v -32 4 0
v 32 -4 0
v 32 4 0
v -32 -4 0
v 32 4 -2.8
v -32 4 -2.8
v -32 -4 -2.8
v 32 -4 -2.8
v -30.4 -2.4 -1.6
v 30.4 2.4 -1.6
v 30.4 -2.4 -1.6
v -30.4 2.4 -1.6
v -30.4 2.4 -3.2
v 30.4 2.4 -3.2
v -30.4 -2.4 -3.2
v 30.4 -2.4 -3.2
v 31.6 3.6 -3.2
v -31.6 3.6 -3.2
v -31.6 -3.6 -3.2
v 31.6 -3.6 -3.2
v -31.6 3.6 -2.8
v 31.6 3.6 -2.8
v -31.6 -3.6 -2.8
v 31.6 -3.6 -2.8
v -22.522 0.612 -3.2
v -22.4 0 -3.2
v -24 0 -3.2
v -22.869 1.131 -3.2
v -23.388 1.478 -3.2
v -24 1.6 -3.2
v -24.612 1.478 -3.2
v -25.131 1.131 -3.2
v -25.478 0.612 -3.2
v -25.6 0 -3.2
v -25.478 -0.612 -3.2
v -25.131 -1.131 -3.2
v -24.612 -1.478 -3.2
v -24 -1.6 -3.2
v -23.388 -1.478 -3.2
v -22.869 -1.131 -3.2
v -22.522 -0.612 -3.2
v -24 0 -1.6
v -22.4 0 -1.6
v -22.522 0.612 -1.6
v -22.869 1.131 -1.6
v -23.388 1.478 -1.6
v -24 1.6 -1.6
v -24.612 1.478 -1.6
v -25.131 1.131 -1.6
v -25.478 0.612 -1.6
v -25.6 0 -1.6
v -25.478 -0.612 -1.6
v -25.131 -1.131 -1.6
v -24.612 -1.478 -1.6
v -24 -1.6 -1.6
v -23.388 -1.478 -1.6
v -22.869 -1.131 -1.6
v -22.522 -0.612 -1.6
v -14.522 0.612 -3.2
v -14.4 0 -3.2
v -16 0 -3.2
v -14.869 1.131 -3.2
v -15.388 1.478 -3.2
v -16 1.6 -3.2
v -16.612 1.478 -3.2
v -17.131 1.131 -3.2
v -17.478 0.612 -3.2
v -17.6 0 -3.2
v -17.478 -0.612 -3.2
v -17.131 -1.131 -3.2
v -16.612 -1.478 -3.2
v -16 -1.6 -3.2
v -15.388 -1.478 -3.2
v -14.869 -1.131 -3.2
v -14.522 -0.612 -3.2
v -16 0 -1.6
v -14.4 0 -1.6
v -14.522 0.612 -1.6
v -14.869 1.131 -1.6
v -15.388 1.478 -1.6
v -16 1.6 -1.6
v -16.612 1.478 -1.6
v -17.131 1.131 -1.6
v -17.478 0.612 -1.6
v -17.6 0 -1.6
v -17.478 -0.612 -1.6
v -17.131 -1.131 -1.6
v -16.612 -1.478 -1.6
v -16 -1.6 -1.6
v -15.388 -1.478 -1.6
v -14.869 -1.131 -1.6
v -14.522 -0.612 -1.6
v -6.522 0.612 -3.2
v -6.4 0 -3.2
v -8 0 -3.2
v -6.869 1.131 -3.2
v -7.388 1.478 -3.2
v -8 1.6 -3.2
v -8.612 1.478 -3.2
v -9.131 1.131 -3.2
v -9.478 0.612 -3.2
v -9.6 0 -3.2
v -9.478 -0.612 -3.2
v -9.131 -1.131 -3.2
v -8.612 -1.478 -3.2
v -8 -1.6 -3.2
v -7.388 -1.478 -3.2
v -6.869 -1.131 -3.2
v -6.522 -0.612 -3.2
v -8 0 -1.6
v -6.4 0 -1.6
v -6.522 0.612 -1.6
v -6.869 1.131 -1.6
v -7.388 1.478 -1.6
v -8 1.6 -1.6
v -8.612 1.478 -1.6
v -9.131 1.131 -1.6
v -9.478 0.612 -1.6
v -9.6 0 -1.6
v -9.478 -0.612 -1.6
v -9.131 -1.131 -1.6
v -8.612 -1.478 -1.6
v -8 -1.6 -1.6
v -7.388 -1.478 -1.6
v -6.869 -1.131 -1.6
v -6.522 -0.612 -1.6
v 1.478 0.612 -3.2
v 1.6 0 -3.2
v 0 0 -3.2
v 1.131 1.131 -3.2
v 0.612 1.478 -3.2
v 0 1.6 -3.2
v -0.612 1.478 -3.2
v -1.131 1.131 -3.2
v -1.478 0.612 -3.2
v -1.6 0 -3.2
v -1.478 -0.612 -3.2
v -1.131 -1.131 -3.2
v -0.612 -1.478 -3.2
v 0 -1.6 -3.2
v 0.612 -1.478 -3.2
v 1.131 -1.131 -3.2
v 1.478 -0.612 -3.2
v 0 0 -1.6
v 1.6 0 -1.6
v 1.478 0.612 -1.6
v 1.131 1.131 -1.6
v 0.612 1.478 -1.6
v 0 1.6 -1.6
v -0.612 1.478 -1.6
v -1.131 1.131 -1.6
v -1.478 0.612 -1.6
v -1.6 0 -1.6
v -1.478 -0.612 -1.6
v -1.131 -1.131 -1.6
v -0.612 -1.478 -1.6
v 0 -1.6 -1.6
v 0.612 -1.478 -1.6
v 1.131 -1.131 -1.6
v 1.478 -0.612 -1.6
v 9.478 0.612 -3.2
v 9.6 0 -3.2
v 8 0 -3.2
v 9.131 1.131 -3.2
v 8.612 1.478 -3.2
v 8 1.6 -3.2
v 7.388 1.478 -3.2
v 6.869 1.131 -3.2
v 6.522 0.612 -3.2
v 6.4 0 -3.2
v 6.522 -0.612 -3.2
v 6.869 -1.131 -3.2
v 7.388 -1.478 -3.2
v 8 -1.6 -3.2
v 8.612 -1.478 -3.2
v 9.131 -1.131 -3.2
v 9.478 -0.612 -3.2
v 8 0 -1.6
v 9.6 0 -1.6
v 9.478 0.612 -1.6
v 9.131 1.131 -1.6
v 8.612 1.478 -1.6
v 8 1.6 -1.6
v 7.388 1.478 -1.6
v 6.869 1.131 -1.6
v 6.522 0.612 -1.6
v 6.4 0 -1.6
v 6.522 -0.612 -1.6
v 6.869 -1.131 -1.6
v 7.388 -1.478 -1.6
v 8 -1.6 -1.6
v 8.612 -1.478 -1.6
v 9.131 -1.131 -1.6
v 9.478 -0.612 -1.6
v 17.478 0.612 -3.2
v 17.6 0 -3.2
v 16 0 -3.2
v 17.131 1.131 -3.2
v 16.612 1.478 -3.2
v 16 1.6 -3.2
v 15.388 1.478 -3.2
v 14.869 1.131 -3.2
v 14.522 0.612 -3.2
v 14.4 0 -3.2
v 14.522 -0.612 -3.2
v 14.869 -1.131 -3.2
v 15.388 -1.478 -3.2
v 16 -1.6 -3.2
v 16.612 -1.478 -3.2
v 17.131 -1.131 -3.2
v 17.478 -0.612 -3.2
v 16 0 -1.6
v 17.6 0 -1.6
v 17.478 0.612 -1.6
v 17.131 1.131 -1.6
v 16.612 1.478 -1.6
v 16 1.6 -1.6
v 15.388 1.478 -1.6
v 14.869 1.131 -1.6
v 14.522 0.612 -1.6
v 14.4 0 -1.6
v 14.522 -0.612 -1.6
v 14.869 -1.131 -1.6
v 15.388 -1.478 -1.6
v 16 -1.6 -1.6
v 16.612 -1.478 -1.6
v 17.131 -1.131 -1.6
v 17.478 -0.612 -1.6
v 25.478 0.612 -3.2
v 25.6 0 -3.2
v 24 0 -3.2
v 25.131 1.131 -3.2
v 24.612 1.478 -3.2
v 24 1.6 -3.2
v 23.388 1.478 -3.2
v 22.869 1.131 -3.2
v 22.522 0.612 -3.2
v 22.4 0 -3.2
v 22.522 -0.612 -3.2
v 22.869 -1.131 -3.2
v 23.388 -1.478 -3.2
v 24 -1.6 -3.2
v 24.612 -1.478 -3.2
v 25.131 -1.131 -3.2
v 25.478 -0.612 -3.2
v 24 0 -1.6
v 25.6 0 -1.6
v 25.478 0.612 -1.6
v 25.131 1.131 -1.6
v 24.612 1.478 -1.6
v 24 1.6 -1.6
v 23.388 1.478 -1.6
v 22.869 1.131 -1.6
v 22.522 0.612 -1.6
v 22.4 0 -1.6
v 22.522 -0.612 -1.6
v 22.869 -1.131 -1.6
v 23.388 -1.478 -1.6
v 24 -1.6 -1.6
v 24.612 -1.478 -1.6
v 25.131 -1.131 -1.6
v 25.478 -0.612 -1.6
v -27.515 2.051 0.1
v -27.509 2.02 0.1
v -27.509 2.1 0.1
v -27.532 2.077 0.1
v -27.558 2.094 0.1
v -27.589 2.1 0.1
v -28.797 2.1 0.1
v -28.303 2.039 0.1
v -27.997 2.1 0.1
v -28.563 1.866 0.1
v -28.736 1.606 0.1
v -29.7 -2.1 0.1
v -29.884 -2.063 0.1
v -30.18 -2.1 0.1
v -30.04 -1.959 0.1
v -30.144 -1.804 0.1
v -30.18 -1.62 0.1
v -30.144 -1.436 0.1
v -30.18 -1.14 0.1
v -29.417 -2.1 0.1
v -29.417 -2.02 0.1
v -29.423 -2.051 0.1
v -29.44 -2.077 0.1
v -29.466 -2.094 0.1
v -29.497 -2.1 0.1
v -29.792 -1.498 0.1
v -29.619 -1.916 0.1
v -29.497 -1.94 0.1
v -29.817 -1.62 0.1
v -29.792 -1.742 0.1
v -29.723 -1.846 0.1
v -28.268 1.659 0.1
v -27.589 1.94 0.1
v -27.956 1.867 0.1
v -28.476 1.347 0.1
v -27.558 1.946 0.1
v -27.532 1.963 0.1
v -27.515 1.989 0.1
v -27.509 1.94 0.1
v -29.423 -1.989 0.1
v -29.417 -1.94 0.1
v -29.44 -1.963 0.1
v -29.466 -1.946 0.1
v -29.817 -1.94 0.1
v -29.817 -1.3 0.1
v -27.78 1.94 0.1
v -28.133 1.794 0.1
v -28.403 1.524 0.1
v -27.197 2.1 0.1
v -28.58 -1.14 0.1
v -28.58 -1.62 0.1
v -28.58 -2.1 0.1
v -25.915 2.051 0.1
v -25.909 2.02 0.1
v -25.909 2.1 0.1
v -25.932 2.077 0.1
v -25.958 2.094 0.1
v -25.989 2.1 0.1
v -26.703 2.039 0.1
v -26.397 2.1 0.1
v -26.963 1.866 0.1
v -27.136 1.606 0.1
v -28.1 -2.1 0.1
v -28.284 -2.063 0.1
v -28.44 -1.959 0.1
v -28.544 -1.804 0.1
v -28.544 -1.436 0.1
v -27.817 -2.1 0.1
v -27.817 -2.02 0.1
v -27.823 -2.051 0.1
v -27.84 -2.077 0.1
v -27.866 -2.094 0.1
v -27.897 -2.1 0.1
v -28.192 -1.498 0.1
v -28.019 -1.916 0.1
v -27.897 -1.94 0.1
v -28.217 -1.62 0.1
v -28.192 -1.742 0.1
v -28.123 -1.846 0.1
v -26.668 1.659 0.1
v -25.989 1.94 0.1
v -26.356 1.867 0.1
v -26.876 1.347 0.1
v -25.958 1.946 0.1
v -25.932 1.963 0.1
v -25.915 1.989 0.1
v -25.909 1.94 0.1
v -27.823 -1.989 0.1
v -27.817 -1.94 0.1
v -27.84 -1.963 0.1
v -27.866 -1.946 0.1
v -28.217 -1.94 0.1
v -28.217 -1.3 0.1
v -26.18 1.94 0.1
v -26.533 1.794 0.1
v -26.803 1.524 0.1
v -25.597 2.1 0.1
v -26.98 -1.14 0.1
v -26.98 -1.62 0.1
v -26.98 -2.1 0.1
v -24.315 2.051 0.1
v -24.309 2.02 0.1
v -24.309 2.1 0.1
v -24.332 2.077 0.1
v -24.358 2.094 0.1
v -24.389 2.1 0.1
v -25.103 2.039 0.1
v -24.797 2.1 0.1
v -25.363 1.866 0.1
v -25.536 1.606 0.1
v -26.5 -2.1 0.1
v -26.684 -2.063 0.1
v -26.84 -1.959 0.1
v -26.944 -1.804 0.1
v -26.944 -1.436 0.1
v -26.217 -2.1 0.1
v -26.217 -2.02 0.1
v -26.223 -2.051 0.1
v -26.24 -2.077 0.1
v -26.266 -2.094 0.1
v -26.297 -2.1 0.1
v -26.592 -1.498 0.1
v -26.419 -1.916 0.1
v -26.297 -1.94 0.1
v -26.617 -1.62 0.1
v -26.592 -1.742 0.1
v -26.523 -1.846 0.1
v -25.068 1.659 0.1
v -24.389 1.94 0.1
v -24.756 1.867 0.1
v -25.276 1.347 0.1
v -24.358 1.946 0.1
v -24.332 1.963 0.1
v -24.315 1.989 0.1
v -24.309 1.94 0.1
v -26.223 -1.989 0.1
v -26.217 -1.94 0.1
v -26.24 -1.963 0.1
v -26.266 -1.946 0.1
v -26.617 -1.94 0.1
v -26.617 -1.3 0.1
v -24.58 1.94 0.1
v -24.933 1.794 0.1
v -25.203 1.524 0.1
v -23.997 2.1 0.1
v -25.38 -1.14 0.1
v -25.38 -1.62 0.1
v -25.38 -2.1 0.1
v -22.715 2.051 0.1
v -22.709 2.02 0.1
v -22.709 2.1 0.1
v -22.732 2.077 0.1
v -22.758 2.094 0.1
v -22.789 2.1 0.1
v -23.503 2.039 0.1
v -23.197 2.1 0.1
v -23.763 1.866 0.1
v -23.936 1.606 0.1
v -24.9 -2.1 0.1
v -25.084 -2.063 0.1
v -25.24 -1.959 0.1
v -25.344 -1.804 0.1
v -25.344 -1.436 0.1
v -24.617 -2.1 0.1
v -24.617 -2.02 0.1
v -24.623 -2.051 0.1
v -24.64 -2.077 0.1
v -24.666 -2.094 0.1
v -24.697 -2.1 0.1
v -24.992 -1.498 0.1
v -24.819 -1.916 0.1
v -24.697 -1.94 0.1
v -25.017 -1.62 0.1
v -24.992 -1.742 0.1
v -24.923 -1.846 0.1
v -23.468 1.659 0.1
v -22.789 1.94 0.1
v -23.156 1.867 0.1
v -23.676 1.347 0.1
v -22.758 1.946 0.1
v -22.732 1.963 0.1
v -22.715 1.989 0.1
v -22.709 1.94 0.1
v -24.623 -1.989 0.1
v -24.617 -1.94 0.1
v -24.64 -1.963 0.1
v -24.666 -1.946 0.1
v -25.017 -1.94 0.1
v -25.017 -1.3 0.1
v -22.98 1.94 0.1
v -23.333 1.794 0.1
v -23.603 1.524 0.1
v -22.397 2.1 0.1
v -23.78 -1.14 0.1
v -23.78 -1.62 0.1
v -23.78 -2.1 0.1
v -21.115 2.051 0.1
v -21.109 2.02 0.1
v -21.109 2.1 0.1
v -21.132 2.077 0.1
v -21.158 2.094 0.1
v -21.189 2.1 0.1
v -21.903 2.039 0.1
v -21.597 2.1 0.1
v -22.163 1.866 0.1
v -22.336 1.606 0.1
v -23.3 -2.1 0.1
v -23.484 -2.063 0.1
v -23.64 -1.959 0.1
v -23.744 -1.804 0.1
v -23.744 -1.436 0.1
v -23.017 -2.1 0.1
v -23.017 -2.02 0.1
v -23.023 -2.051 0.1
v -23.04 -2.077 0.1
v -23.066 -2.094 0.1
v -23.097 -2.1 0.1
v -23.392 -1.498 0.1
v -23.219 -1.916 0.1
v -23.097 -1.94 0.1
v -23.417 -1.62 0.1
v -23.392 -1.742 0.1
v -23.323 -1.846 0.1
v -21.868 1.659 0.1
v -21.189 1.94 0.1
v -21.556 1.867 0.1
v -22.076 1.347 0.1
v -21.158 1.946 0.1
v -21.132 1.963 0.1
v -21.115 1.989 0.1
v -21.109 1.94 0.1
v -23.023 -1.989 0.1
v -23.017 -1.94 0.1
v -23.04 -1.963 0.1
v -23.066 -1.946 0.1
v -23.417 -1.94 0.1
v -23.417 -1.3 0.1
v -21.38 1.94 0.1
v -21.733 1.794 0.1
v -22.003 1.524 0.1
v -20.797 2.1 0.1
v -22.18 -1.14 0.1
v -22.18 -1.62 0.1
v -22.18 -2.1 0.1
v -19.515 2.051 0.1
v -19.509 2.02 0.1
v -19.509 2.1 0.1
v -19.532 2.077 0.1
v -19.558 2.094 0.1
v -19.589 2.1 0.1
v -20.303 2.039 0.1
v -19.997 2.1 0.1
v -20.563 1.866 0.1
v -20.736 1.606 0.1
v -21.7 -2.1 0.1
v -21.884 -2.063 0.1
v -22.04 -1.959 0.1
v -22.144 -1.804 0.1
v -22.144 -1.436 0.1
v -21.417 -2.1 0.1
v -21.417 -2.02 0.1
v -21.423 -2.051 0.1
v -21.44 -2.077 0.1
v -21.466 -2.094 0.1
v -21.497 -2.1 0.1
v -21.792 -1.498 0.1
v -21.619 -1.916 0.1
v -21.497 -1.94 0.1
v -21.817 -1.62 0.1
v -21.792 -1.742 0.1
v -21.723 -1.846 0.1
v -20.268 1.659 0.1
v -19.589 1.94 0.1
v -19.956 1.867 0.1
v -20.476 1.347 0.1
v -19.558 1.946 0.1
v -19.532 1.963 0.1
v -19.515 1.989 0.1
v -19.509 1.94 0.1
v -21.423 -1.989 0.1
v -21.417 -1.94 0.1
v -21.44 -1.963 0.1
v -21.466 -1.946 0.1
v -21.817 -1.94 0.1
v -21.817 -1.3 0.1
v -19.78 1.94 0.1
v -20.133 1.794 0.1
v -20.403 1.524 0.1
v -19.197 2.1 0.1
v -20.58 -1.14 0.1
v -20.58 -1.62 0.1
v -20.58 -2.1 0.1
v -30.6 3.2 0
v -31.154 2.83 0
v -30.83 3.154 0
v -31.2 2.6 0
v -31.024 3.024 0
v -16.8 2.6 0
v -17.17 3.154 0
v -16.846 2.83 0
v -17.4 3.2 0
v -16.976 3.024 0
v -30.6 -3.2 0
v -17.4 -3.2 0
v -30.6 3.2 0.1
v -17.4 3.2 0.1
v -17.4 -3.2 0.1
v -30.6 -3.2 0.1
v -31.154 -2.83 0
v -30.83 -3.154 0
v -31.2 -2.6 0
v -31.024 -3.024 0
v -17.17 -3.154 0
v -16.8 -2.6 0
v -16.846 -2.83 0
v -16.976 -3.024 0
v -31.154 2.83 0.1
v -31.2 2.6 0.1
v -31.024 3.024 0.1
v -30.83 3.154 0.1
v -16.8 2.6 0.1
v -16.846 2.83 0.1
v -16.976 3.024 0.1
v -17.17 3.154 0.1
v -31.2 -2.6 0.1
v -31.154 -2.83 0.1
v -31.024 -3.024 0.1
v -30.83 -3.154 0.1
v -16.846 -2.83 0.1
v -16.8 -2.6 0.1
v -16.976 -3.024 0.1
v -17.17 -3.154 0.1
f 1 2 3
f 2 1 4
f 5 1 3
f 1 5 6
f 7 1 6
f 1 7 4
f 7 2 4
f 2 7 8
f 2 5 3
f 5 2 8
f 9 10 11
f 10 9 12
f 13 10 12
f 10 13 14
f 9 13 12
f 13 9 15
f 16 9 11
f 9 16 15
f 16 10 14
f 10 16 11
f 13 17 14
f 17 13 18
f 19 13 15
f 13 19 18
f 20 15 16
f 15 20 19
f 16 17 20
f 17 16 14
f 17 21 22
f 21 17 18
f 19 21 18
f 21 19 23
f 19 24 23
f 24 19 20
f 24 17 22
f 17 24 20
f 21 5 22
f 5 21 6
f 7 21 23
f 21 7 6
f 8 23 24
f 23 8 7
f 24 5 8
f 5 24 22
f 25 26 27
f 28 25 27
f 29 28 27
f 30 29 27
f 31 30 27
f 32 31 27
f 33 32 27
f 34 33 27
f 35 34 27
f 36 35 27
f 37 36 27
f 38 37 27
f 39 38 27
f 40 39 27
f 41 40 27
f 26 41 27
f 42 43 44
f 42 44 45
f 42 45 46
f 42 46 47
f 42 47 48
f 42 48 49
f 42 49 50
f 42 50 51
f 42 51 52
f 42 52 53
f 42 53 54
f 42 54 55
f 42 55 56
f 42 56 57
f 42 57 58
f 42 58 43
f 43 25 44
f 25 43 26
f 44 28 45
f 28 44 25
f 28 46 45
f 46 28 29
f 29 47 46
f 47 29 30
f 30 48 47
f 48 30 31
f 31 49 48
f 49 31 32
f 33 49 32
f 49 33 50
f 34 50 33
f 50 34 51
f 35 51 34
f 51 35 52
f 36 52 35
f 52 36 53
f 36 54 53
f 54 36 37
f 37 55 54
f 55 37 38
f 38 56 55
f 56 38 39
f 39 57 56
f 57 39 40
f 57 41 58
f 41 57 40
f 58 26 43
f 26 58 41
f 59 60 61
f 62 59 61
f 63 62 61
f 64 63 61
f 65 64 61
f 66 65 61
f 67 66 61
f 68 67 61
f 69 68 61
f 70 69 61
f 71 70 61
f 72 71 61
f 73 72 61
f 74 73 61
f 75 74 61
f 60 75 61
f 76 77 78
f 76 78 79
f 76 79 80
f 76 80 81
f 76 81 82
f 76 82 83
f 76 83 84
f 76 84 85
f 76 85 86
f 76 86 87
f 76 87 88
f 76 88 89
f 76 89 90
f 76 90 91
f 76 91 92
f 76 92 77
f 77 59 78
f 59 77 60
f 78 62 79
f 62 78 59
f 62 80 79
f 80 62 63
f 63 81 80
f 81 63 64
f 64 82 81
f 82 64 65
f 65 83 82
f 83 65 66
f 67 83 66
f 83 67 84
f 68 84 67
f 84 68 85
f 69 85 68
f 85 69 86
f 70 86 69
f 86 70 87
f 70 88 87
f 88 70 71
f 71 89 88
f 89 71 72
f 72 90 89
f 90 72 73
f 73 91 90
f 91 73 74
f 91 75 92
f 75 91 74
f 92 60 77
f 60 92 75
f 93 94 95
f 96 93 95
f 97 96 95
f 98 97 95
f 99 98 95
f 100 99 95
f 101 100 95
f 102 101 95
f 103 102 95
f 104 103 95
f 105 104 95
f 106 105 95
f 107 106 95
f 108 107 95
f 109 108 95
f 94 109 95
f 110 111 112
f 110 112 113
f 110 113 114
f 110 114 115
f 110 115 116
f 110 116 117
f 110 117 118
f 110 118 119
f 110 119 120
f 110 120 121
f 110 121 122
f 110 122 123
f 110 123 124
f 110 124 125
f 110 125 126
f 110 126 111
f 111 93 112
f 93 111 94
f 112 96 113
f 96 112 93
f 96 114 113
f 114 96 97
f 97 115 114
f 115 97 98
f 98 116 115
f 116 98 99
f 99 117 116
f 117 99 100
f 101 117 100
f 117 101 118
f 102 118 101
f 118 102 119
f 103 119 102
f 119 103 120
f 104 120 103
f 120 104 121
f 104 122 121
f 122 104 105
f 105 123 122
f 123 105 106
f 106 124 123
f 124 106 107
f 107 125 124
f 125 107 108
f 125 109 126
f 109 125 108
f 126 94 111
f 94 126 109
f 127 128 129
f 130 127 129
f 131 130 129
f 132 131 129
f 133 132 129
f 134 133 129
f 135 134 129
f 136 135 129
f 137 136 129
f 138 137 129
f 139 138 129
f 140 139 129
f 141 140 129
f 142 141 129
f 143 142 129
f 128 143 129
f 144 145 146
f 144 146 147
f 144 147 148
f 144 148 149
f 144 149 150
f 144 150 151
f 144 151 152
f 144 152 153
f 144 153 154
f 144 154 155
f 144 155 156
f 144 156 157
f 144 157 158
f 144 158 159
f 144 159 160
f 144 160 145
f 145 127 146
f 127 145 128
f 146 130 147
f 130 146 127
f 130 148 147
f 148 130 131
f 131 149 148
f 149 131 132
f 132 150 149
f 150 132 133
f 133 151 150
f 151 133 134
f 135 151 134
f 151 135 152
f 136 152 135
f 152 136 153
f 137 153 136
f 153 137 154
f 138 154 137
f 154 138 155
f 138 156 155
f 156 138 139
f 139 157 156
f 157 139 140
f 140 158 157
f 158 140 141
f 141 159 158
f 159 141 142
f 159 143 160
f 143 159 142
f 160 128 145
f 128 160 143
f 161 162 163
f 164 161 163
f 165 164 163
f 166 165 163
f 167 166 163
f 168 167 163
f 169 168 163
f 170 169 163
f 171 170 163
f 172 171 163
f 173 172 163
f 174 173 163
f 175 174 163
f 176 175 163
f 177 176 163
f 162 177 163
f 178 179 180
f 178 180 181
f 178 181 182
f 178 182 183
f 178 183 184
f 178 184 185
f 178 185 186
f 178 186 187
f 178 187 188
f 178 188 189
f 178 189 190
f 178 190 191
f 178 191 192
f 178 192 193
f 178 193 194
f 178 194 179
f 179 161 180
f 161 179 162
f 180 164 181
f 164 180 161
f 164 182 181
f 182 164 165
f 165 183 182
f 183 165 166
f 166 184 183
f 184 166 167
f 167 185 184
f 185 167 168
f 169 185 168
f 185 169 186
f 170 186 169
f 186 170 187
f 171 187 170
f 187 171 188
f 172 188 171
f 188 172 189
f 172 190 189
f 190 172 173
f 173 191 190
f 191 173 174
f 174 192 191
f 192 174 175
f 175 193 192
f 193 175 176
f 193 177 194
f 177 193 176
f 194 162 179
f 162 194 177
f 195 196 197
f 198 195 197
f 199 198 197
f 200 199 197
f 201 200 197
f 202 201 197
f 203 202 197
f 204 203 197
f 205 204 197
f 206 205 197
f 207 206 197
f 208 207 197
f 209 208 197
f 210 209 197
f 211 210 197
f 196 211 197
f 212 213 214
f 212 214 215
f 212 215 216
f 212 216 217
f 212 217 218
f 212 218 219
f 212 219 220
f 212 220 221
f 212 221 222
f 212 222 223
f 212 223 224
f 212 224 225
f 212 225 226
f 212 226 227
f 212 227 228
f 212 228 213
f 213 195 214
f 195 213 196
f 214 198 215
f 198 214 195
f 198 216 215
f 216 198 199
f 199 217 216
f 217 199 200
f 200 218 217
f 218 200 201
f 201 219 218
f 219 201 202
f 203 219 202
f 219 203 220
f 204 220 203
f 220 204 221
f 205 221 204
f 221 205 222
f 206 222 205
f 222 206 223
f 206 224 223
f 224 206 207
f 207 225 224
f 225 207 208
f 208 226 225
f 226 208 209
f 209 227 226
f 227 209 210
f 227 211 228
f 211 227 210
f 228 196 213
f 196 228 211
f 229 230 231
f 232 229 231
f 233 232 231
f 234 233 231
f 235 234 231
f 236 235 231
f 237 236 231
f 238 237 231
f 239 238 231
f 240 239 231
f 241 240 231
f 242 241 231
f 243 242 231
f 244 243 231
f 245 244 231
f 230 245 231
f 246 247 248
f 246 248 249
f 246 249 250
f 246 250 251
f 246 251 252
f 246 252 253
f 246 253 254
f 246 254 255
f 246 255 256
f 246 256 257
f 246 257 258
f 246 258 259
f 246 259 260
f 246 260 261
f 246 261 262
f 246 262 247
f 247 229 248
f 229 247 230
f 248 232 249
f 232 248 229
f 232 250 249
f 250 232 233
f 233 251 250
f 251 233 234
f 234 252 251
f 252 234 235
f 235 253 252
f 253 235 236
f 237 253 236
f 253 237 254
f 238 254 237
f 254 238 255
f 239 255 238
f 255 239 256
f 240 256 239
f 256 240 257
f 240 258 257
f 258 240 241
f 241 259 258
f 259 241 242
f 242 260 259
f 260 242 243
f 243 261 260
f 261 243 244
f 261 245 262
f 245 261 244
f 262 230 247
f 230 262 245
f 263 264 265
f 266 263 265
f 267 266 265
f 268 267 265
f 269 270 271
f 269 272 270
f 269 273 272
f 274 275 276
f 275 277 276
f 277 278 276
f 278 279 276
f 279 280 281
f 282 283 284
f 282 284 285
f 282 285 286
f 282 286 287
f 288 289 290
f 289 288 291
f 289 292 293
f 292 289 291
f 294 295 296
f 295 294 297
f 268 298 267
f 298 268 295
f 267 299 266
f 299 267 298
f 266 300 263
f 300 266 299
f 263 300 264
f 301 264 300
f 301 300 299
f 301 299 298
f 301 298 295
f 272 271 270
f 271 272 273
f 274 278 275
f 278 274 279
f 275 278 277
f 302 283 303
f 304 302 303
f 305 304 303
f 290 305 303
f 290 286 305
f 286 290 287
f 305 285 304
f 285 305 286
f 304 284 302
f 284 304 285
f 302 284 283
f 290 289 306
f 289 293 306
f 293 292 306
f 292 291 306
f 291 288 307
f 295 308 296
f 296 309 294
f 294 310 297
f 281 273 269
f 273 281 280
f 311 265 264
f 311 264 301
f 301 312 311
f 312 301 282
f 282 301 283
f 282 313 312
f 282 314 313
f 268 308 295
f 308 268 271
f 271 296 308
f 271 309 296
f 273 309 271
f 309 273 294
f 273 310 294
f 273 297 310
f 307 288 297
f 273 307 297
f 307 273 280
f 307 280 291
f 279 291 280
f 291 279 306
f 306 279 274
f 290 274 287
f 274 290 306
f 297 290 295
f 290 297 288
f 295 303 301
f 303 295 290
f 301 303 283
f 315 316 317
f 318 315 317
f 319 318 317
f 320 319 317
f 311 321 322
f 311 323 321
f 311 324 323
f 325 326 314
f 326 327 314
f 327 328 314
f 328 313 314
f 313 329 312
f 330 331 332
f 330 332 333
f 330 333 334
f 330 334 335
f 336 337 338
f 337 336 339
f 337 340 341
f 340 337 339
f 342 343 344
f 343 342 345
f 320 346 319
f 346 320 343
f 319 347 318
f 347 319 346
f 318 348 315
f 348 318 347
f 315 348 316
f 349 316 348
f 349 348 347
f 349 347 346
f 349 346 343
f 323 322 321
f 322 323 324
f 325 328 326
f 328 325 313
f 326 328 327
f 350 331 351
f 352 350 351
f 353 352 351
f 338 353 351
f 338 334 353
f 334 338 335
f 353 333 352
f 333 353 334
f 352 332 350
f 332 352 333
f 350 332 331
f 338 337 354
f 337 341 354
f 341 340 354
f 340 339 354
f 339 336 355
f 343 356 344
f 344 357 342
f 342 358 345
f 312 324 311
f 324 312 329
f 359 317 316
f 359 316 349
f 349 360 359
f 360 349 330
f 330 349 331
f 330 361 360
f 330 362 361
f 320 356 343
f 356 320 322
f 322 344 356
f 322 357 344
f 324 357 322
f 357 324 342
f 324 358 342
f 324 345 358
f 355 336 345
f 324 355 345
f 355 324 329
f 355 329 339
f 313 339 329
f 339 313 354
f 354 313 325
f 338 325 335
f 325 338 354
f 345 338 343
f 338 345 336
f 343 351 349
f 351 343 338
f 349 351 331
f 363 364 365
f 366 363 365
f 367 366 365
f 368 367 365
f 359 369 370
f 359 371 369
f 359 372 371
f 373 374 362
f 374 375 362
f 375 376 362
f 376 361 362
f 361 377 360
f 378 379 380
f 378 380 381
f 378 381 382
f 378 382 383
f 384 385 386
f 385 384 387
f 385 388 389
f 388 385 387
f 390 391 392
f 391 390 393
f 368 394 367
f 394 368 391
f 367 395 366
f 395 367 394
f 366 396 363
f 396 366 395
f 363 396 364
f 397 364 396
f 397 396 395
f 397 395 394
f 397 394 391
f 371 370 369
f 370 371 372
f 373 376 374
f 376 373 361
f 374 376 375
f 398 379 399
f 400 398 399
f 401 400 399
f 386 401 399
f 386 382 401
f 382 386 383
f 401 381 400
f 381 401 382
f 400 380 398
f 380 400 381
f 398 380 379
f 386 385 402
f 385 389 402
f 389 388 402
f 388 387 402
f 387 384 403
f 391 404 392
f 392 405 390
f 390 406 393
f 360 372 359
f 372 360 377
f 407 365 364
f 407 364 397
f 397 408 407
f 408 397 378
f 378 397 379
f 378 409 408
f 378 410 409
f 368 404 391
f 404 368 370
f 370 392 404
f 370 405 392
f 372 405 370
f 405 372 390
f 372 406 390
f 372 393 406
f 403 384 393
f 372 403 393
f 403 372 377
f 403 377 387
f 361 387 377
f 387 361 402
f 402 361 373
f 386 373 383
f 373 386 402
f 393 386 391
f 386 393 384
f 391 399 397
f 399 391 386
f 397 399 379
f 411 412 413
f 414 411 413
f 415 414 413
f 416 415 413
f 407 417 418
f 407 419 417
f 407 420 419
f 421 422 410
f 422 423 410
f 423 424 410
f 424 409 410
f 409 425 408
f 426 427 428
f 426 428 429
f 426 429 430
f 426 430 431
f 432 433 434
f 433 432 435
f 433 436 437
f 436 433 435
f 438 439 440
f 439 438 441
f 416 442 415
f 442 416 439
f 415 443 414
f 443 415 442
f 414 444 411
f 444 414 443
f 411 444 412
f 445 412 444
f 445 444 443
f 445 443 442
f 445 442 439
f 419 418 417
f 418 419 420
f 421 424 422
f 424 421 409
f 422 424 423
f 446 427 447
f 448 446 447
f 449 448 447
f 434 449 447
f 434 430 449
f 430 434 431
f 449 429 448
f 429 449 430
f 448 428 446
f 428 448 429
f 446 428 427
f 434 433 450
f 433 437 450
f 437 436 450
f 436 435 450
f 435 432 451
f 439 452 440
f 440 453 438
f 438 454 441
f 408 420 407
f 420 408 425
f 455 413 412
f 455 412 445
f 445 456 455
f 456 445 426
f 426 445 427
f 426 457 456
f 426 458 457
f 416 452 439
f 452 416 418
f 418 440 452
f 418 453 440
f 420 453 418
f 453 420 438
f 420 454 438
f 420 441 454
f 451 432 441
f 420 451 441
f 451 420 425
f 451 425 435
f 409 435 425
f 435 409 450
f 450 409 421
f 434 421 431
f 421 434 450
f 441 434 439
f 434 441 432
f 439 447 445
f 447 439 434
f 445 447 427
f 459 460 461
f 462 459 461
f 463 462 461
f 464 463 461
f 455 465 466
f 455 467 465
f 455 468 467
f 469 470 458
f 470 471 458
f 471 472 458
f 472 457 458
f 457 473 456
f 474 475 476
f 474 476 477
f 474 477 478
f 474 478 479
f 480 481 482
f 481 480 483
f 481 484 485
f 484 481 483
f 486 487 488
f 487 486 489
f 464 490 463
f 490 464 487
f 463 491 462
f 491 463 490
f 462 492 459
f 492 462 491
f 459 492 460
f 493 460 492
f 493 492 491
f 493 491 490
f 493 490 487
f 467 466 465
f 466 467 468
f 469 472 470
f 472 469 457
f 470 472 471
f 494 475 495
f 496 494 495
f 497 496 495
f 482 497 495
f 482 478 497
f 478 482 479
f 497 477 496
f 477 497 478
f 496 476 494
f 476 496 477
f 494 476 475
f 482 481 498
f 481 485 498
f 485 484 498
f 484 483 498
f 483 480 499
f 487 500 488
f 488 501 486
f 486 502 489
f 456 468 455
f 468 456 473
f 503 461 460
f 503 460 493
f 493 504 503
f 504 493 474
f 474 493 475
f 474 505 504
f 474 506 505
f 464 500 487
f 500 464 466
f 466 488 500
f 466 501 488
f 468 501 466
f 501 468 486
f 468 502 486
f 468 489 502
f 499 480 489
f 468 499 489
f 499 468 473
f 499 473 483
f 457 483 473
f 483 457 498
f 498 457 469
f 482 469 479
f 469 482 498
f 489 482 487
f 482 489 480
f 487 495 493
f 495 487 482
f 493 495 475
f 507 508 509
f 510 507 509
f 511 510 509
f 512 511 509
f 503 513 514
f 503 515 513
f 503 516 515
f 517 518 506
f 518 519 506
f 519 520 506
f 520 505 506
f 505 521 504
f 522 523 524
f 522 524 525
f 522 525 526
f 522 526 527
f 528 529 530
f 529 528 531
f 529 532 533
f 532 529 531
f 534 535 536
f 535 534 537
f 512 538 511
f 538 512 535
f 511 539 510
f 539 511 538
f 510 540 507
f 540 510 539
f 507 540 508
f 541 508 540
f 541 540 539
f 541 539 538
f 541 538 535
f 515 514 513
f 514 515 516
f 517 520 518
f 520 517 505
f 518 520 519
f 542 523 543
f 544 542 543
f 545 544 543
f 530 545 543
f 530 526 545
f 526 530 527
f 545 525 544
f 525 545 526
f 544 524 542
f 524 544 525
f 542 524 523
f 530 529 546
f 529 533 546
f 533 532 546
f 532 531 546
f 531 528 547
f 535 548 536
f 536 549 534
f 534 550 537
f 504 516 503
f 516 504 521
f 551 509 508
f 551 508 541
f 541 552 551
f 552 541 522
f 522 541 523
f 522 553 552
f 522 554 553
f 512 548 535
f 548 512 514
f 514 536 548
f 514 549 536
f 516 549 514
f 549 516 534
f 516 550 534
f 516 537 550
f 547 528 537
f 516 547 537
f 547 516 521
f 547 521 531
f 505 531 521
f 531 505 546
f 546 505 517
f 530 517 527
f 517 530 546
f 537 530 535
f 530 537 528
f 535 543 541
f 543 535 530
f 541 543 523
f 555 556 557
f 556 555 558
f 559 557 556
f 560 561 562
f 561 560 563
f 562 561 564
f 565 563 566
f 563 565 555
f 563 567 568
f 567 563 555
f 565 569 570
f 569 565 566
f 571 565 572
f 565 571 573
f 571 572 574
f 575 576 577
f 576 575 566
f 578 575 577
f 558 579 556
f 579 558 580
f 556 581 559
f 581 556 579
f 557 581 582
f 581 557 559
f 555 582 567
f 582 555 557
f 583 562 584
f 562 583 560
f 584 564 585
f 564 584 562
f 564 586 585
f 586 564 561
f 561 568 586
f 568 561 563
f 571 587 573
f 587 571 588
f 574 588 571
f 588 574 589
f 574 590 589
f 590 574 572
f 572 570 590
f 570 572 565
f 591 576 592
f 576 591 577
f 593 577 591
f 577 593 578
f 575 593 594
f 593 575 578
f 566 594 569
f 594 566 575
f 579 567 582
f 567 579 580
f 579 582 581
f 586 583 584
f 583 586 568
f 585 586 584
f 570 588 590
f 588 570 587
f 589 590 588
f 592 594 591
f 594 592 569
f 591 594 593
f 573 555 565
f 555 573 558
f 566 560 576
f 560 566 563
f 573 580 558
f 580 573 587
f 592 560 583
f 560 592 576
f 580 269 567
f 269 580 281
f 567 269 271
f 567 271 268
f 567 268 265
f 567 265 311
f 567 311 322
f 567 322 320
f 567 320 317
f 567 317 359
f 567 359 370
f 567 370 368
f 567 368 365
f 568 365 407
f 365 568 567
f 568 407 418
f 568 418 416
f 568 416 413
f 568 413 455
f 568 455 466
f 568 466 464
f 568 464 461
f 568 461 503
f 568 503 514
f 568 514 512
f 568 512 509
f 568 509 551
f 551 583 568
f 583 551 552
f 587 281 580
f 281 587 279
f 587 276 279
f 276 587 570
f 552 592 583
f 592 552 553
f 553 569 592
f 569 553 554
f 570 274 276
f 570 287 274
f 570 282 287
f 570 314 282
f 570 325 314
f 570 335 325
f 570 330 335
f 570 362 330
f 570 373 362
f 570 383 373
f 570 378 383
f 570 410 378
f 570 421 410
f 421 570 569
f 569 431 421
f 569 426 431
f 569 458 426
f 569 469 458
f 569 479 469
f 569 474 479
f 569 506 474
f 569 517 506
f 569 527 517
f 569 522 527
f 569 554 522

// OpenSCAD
use <../lib.scad>
use <4162.scad>
use <6177741s.scad>
function ldraw_lib__4162d0m() = [
// 0 Tile  1 x  8 with Six Black Air Scope on Transparent Background Right Sticker
// 0 Name: 4162d0m.dat
// 0 Author: Alfred Schmitz [AlfredS]
// 0 !LDRAW_ORG Shortcut UPDATE 2026-08
// 0 !LICENSE Licensed under CC BY 4.0 : see CAreadme.txt
// 
// 0 BFC CERTIFY CCW
  [0,"BFC","CERTIFY"],
  [0,"BFC","CCW"],
// 
// 0 !CATEGORY Sticker Shortcut
// 0 !KEYWORDS AMG, GT3, Mercedes, Set 75877, Speed Champions
// 
// 0 !HISTORY 2026-08-31 [OrionP] Official Update 2026-08
// 
// 1 16 0 0 0 1 0 0 0 1 0 0 0 1 4162.dat
  [1,16,0,0,0,1,0,0,0,1,0,0,0,1, ldraw_lib__4162()],
// 1 16 -60 0 0 1 0 0 0 1 0 0 0 1 6177741s.dat
  [1,16,-60,0,0,1,0,0,0,1,0,0,0,1, ldraw_lib__6177741s()],
];
module ldraw_lib__4162d0m(step=0, col=false, unit=2/5, alt=false, line=0.2, solid=!$preview)
    makepoly(ldraw_lib__4162d0m(), step=step, col=col, unit=unit, alt=alt, line=line, solid=solid);
ldraw_lib__4162d0m(line=0.2);
